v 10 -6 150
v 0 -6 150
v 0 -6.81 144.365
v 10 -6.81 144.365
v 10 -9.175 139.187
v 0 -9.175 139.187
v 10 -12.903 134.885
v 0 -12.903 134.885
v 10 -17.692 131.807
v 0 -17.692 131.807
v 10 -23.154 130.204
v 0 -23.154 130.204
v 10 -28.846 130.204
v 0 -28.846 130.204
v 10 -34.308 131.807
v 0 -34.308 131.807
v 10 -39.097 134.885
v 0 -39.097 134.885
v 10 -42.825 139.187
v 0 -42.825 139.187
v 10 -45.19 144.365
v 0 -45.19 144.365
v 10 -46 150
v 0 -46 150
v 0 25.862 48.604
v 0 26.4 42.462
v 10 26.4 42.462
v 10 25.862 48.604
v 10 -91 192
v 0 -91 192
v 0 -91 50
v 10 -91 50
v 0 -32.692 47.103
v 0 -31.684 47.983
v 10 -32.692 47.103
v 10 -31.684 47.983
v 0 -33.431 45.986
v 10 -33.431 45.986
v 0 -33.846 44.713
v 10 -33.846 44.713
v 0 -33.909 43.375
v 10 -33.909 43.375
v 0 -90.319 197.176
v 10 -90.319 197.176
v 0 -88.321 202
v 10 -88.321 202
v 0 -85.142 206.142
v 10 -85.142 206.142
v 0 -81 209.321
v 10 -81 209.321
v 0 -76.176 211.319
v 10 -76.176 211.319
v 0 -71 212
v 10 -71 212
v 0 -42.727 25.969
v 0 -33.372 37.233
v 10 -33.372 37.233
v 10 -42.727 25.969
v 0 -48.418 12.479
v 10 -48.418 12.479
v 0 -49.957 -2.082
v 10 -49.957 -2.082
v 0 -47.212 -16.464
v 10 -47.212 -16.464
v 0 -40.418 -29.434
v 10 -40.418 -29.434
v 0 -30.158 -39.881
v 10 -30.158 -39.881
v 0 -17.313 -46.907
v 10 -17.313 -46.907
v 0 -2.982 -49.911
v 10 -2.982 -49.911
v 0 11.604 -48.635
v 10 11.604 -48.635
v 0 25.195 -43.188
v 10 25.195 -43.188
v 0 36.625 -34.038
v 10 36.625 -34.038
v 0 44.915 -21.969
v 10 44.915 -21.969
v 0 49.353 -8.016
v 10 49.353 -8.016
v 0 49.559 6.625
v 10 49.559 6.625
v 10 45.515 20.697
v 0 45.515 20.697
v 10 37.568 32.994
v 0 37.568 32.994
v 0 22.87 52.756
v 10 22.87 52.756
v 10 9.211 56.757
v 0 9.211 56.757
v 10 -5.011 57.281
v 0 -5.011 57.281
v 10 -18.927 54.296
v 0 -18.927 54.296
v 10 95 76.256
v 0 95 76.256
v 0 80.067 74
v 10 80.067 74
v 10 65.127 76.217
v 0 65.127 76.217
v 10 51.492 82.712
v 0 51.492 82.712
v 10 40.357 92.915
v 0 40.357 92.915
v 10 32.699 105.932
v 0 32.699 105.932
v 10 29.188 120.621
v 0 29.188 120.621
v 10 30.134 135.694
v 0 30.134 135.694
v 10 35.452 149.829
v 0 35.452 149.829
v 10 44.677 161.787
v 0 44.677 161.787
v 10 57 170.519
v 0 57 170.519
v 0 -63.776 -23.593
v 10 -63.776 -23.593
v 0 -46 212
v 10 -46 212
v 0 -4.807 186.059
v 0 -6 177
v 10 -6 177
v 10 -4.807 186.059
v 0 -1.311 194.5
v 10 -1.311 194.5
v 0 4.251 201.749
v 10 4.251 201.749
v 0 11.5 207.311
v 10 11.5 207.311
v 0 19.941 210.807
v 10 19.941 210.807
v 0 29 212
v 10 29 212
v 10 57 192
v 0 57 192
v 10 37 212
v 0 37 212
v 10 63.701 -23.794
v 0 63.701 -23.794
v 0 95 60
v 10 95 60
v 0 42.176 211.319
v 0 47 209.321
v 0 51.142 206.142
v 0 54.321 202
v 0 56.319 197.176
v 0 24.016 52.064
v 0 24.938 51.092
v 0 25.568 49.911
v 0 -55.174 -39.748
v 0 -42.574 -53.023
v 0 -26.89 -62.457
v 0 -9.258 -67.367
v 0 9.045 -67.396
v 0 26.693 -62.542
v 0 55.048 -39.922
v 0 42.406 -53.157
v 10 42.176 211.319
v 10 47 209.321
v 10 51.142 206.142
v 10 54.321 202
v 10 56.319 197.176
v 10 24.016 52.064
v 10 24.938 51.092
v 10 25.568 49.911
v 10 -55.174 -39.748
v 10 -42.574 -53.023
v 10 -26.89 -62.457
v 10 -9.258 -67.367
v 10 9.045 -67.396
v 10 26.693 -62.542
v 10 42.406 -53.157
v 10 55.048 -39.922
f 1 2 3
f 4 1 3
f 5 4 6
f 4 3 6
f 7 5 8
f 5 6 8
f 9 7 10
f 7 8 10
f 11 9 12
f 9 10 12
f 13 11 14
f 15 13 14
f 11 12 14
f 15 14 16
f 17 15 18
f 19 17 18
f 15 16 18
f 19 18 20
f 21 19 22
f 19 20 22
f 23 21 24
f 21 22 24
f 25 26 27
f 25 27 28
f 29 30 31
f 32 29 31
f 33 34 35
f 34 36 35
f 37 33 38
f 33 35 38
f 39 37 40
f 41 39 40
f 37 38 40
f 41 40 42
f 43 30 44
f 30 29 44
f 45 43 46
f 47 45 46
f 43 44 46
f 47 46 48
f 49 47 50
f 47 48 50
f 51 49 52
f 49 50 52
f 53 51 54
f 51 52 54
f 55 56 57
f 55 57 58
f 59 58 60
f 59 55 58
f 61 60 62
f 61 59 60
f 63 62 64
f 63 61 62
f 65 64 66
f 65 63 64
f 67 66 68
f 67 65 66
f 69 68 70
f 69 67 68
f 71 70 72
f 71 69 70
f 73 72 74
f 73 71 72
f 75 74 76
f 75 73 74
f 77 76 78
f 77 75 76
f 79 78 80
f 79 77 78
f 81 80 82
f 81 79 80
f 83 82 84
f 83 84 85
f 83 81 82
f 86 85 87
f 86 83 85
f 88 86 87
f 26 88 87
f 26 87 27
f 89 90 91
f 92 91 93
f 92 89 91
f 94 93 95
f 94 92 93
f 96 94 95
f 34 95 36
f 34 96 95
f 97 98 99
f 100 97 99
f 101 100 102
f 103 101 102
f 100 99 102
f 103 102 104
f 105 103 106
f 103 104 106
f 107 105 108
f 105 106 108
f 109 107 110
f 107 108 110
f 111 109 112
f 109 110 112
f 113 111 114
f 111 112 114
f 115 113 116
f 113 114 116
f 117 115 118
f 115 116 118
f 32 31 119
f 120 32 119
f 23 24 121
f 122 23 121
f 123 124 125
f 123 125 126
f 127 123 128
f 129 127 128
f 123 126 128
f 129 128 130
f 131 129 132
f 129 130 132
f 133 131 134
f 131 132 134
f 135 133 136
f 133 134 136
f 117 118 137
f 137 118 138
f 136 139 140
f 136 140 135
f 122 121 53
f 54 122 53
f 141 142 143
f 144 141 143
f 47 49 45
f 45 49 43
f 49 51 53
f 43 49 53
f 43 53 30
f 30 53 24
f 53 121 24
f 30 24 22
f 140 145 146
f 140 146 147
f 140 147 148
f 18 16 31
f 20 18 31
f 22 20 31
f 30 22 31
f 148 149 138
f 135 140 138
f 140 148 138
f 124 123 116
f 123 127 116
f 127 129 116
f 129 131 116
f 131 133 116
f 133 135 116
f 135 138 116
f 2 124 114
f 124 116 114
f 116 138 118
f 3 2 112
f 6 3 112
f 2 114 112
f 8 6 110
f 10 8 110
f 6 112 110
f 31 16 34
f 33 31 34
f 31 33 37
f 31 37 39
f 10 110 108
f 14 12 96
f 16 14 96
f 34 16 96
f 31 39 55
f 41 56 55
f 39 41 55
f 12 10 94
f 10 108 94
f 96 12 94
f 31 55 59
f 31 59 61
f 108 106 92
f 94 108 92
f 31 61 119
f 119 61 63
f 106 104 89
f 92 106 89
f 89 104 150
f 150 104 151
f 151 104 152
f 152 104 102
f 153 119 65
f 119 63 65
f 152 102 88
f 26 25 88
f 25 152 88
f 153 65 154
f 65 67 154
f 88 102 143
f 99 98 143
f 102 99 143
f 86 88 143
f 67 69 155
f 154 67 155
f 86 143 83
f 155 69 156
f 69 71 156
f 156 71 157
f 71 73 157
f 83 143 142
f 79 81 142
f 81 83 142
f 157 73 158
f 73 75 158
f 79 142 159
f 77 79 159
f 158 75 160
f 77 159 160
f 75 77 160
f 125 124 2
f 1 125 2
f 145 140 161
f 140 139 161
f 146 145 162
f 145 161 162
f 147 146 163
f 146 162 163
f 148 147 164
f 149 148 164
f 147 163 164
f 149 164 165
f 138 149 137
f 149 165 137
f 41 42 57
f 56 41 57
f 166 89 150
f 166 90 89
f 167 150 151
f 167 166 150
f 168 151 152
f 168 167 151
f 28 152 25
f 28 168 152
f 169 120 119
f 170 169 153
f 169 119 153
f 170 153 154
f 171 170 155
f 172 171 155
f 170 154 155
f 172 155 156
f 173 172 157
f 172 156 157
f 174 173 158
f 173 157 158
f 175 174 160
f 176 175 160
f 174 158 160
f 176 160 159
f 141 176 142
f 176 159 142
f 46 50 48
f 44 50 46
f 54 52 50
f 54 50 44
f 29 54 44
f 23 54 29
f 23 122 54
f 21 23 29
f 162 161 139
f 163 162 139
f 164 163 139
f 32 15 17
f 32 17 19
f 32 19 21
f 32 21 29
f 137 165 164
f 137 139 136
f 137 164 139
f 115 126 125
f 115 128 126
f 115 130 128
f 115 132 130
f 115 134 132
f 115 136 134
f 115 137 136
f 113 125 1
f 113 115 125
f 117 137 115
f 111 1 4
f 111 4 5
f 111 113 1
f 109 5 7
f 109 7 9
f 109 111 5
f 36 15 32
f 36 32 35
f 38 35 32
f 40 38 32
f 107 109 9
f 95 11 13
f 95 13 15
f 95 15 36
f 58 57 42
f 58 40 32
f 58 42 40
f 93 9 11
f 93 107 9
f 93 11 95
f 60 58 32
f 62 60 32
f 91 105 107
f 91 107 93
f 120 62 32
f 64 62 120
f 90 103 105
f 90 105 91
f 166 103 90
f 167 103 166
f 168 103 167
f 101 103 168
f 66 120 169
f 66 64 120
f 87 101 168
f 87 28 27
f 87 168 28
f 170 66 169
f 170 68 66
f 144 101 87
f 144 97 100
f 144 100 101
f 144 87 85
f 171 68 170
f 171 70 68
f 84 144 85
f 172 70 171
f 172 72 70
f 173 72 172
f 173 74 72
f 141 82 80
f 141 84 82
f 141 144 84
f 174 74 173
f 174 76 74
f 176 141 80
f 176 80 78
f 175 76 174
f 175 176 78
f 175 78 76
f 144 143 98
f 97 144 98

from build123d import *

# Parameters (mm, degrees)
SKETCH_1_R          = 50
EXTRUDE_1_DEPTH     = 10
FILLET_1_R          = 20
FILLET_2_R          = 35
CUT_EXTRUDE_START   = -12
CUT_EXTRUDE_1_DEPTH = 12
FILLET_3_R          = 5


with BuildPart() as part:
    # 草图1 → 凸台-拉伸1 (new body)
    with BuildSketch(Plane(origin=(0, 0, 0), x_dir=(0, 0, -1), z_dir=(1, 0, 0))):
        with BuildLine():
            Line((-212, -91), (-50, -91))
            Line((-50, -91), (23.592526884, -63.776113673))
            ThreePointArc((23.592526884, -63.776113673), (67.999915285, -0.107337145), (23.793748654, 63.701314939))
            Line((23.793748654, 63.701314939), (-60, 95))
            Line((-60, 95), (-76.255769572, 95))
            ThreePointArc((-76.255769572, 95), (-105.931697447, 32.698838939), (-170.519226707, 57))
            Line((-170.519226707, 57), (-212, 57))
            Line((-212, 57), (-212, -6))
            Line((-212, -6), (-150, -6))
            ThreePointArc((-150, -6), (-130, -26), (-150, -46))
            Line((-150, -46), (-212, -46))
            Line((-212, -46), (-212, -91))
        make_face()
        Circle(SKETCH_1_R, mode=Mode.SUBTRACT)
    extrude(amount=EXTRUDE_1_DEPTH)

    # 圆角1
    fillet_1_edges = [part.edges().sort_by_distance(p)[0] for p in [
        (5, 57, 212),
        (5, -91, 212),
    ]]
    fillet(fillet_1_edges, radius=FILLET_1_R)

    # 圆角2
    fillet_2_edges = [part.edges().sort_by_distance(p)[0] for p in [
        (5, -6, 212),
    ]]
    fillet(fillet_2_edges, radius=FILLET_2_R)

    # 草图2 → 切除-拉伸1 (cut)
    with BuildSketch(Plane(origin=(10, 0, 0), x_dir=(0, 0, -1), z_dir=(1, 0, 0)).offset(CUT_EXTRUDE_START)):
        with BuildLine():
            Line((-42.462460206, 26.399611233), (-51.481550921, 25.61054304))
            ThreePointArc((-51.481550921, 25.61054304), (-57.28119514, -5.011455208), (-46.252206356, -34.161138845))
            Line((-46.252206356, -34.161138845), (-37.233115641, -33.372070653))
            ThreePointArc((-37.233115641, -33.372070653), (-49.809734905, -4.357787137), (-42.462460206, 26.399611233))
        make_face()
    extrude(amount=CUT_EXTRUDE_1_DEPTH, mode=Mode.SUBTRACT)

    # 圆角3
    fillet_3_edges = [part.edges().sort_by_distance(p)[0] for p in [
        (5, -34.161138845, 46.252206356),
        (5, 25.61054304, 51.481550921),
    ]]
    fillet(fillet_3_edges, radius=FILLET_3_R)


solid = part.part
